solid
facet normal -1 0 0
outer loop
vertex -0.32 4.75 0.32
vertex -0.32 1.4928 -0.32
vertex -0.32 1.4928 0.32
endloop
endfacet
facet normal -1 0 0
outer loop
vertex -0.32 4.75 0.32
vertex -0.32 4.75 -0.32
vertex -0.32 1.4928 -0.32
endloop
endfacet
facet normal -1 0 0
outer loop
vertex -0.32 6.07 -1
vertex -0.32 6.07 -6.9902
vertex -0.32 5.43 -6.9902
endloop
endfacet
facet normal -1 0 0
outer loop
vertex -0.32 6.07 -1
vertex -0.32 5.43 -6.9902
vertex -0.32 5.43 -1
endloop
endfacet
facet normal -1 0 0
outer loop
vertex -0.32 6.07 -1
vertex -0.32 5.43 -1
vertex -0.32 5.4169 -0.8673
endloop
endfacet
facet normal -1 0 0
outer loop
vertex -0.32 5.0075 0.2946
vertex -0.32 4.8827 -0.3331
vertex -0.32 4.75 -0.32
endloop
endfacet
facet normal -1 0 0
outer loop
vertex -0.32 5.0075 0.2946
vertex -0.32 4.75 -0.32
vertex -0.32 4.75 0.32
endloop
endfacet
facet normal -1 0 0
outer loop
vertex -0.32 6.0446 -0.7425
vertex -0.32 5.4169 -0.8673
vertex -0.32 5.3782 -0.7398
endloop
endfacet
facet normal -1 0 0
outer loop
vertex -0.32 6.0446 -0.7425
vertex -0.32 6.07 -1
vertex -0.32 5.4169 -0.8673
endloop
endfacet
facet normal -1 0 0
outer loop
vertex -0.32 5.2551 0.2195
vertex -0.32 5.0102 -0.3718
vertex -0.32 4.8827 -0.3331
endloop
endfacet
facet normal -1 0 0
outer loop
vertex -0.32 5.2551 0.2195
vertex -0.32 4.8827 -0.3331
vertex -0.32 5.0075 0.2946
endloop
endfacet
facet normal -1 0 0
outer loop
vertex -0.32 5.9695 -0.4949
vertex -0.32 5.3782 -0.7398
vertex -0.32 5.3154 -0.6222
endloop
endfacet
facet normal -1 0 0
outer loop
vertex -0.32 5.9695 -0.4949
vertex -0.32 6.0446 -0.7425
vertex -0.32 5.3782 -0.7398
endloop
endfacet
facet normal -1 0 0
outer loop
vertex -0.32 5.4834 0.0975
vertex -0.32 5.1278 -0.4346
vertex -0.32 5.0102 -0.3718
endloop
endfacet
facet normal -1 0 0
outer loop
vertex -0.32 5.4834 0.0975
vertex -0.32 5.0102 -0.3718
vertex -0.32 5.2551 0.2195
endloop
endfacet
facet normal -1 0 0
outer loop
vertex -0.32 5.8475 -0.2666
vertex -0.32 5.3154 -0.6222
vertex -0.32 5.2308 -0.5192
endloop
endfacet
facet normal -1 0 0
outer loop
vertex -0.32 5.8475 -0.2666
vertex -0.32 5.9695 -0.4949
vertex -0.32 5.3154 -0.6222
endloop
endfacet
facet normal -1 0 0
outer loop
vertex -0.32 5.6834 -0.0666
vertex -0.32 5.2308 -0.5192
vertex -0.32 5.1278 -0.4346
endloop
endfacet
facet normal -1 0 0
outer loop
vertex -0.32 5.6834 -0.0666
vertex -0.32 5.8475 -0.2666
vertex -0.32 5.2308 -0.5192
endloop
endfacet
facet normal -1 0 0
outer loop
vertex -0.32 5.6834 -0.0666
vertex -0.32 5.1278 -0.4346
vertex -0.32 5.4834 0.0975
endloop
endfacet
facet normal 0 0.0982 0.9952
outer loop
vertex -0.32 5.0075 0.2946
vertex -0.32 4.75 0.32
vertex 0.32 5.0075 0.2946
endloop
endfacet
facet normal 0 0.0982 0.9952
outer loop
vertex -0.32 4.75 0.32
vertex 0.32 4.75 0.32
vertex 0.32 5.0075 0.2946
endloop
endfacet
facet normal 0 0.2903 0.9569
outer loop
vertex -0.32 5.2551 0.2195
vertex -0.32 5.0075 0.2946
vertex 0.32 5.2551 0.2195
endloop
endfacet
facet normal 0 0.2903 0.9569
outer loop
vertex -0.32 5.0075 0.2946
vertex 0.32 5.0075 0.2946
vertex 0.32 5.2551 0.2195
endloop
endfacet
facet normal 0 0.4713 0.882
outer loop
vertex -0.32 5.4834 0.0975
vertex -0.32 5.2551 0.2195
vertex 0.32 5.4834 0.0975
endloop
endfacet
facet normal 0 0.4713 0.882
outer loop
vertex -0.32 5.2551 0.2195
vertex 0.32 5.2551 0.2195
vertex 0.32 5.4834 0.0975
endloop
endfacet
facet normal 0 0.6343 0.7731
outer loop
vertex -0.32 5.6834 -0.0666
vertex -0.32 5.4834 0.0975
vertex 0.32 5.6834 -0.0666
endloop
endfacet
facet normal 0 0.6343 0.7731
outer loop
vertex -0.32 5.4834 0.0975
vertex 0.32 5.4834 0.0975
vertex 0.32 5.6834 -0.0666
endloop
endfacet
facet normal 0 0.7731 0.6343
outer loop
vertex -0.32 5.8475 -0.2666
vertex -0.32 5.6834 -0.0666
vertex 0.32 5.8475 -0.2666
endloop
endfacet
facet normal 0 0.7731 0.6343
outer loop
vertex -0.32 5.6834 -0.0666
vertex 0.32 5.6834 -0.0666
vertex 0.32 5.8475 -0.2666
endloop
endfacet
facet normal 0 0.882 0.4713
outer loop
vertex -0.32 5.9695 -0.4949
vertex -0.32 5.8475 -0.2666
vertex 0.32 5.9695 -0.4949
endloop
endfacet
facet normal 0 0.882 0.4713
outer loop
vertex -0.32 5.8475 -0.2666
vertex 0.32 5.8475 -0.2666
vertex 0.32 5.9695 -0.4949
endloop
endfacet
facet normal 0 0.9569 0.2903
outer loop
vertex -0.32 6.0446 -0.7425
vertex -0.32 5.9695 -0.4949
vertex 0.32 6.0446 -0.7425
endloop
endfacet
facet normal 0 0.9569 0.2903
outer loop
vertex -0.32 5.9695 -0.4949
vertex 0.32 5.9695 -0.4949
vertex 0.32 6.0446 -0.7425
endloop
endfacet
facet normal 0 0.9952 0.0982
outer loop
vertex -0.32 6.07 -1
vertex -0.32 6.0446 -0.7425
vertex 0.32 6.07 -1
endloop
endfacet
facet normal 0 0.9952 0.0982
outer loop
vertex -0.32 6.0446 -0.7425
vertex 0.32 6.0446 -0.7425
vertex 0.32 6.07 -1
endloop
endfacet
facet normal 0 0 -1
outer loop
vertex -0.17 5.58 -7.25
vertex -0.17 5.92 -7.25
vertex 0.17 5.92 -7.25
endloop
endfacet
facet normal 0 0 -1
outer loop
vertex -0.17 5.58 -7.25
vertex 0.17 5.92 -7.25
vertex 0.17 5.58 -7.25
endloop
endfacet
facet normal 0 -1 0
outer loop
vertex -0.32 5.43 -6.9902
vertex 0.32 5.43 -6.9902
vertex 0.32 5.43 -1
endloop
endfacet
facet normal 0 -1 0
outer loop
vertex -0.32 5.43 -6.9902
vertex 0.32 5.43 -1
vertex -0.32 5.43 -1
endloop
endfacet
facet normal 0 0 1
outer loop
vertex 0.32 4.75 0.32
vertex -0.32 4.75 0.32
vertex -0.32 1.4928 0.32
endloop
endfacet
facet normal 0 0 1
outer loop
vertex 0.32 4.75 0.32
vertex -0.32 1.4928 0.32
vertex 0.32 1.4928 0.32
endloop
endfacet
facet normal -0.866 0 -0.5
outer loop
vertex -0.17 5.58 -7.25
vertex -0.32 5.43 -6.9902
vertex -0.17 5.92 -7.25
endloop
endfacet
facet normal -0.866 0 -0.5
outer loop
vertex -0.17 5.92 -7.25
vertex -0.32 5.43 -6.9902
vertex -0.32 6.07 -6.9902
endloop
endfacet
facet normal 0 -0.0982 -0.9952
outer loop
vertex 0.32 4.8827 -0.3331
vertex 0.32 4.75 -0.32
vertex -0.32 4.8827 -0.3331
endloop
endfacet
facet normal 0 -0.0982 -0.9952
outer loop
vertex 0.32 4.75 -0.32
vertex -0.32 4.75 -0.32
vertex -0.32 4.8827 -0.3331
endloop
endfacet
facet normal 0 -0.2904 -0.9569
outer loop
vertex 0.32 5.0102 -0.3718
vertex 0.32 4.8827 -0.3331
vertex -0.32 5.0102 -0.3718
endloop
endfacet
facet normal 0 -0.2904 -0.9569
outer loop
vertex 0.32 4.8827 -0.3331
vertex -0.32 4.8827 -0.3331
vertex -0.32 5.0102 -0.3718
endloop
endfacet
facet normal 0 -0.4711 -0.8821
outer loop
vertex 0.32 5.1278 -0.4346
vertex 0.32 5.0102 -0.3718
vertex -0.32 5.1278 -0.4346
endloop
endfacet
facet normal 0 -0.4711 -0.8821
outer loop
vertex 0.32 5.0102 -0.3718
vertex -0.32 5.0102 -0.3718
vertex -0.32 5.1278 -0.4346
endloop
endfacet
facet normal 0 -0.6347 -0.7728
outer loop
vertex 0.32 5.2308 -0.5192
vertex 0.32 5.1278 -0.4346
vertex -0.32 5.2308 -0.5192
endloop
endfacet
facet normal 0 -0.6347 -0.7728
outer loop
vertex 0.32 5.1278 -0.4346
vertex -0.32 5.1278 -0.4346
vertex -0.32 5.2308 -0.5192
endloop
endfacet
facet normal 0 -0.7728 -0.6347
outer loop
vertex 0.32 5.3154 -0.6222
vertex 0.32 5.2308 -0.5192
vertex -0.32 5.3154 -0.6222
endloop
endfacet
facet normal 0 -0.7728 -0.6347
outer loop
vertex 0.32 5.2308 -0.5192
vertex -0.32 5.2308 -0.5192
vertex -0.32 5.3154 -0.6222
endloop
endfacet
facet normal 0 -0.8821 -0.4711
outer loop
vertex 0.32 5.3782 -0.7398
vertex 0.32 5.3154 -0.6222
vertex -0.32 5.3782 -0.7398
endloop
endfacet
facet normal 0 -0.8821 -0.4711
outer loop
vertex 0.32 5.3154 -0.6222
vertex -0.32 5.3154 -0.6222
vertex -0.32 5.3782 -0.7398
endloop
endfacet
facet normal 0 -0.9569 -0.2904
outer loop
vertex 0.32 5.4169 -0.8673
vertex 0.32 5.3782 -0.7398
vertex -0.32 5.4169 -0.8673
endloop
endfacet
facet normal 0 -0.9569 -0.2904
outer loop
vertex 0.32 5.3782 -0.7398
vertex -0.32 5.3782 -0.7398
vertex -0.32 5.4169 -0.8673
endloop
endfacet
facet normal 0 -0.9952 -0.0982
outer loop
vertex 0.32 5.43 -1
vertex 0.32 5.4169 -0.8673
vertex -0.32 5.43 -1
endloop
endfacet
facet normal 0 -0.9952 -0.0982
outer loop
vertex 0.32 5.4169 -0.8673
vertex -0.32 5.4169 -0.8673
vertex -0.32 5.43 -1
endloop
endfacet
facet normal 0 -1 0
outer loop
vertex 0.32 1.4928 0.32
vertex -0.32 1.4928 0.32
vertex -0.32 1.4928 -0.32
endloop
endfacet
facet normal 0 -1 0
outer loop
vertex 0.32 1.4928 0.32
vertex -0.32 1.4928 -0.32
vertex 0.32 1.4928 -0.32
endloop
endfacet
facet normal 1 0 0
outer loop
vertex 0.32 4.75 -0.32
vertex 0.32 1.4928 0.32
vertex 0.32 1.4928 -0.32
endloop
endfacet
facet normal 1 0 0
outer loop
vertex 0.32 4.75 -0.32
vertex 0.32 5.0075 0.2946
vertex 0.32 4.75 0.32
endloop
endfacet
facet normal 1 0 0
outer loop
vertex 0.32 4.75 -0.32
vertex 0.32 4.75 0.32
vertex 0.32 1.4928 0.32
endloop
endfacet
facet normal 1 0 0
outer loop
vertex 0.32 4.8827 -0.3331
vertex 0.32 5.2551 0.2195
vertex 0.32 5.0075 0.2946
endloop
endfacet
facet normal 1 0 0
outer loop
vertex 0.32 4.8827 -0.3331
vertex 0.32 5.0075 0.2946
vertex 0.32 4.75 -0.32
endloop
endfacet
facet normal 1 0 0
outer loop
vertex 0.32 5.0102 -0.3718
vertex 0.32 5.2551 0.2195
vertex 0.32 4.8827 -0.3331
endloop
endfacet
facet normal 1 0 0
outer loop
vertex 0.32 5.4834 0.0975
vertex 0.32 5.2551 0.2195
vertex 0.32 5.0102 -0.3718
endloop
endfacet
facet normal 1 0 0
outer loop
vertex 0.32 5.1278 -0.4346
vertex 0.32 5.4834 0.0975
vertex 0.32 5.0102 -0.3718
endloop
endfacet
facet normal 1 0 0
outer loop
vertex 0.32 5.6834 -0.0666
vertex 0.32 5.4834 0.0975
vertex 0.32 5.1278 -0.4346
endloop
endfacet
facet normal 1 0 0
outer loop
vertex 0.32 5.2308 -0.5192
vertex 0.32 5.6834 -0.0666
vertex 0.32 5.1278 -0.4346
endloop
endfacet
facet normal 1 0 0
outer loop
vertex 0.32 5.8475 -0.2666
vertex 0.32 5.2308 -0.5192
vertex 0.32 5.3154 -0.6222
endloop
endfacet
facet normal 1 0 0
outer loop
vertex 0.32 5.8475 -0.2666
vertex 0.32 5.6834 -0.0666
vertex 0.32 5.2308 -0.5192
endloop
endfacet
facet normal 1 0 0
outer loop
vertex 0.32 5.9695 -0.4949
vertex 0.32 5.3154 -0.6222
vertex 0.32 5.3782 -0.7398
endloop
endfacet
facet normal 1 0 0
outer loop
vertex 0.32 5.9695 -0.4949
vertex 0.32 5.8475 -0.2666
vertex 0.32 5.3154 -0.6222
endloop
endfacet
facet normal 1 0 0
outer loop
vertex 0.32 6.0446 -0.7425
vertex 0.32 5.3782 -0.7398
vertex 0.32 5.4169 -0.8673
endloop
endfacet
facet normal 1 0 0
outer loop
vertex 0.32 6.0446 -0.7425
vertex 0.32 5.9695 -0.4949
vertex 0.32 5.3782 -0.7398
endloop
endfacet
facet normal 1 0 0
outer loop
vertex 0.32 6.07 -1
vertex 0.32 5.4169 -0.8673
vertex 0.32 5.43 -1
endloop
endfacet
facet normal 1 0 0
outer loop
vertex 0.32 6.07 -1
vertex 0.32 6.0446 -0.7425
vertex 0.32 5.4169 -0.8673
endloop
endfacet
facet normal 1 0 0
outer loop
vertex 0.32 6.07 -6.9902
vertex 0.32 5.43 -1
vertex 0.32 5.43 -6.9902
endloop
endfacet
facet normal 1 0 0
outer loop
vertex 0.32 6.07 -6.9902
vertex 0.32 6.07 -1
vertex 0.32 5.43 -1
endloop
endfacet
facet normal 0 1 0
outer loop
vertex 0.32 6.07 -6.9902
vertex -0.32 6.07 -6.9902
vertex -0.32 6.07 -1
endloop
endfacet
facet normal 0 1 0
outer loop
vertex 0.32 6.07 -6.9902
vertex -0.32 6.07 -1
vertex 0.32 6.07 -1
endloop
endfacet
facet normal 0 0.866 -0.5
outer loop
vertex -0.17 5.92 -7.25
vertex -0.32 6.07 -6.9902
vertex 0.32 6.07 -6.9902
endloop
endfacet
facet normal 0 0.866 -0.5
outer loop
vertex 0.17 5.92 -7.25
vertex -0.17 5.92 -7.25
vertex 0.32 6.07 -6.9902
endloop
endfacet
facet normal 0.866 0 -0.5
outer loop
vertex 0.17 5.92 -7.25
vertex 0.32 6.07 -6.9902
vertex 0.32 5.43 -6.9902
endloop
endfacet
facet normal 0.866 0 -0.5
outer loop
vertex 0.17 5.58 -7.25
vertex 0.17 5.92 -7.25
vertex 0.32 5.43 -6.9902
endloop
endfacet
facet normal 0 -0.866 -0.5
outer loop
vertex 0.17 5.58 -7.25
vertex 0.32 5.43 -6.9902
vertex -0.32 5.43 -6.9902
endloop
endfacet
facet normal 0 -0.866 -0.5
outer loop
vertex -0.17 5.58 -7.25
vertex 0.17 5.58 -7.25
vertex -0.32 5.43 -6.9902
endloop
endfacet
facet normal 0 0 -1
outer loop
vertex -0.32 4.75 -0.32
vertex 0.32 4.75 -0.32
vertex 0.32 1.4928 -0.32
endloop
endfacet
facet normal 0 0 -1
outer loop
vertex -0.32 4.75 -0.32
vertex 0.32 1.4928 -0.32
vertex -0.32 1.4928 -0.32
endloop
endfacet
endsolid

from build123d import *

# Parameters (mm, degrees)
SKETCH_3_W             = 0.64
SKETCH_3_H             = 0.64
CHAMFER_1_SIZE         = 0.15
CHAMFER_1_SIZE2        = 0.259807621
CHAMFER_1_PART_2_SIZE  = 0.15
CHAMFER_1_PART_2_SIZE2 = 0.259807621
SKETCH1_W              = 0.64
SKETCH1_H              = 4.734584987
CUT_EXTRUDE1_DEPTH     = 8.57


with BuildPart() as part:
    # Sweep 1: sweep along a path in Sketch 2
    with BuildLine(Plane(origin=(0, 0, 0), x_dir=(0, 0, -1), z_dir=(1, 0, 0))) as sweep_1_path:
        Line((0, -3), (0, 0))
        Line((0, 0), (0, 4.75))
        ThreePointArc((0, 4.75), (0.292893219, 5.457106781), (1, 5.75))
        Line((1, 5.75), (7.25, 5.75))
    # Sketch 3 → Sweep 1 (sweep)
    with BuildSketch(Plane(origin=(0, 0, 0), x_dir=(1, 0, 0), z_dir=(0, 1, 0))):
        Rectangle(SKETCH_3_W, SKETCH_3_H)
    sweep(path=sweep_1_path.line)

    # Chamfer 1
    chamfer_1_edges = [part.edges().sort_by_distance(p)[0] for p in [
        (0, 5.43, -7.25),
        (-0.32, 5.75, -7.25),
        (0, 6.07, -7.25),
        (0.32, 5.75, -7.25),
    ]]
    chamfer_1_side = [part.faces().sort_by_distance(p)[0] for p in [
        (0, 5.75, -7.25),
    ]]
    chamfer(chamfer_1_edges, length=CHAMFER_1_SIZE, length2=CHAMFER_1_SIZE2, reference=chamfer_1_side[0])

    # Chamfer 1 part 2
    chamfer_1_part_2_edges = [part.edges().sort_by_distance(p)[0] for p in [
        (0.32, -3, 0),
        (0, -3, -0.32),
        (-0.32, -3, 0),
        (0, -3, 0.32),
    ]]
    chamfer_1_part_2_side = [part.faces().sort_by_distance(p)[0] for p in [
        (0, -3, 0),
    ]]
    chamfer(chamfer_1_part_2_edges, length=CHAMFER_1_PART_2_SIZE, length2=CHAMFER_1_PART_2_SIZE2, reference=chamfer_1_part_2_side[0])

    # Sketch1 → Cut-Extrude1 (cut, through all)
    with BuildSketch(Plane.XY.offset(0.32)):
        with Locations((0, -0.874507109)):
            Rectangle(SKETCH1_W, SKETCH1_H)
    extrude(amount=-CUT_EXTRUDE1_DEPTH, mode=Mode.SUBTRACT)


solid = part.part
